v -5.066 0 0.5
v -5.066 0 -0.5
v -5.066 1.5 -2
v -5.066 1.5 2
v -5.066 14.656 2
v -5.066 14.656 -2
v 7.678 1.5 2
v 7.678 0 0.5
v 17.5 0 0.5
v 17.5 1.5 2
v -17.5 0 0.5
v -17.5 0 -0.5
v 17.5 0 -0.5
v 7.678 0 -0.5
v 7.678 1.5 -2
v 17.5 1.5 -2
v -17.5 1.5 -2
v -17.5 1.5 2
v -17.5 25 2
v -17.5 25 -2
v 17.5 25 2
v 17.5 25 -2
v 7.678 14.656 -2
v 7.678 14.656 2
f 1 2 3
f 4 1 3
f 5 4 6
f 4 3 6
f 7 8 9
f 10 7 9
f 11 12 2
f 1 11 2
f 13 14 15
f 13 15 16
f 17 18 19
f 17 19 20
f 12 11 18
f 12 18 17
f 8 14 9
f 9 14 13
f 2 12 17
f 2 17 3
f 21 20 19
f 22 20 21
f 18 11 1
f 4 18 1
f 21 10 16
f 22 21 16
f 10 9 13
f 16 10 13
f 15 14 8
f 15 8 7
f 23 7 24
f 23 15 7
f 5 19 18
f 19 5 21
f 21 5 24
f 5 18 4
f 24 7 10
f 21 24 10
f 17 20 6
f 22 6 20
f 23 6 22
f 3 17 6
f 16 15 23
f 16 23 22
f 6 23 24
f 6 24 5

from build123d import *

# Parameters (mm, degrees)
SKETCH_1_W          = 35
SKETCH_1_H          = 4
EXTRUDE_1_DEPTH     = 25
CHAMFER_1_SIZE      = 1.5
SKETCH_2_W          = 12.744138526
SKETCH_2_H          = 17.309109507
CUT_EXTRUDE_1_DEPTH = 10


with BuildPart() as part:
    # 草图1 → 凸台-拉伸1 (new body)
    with BuildSketch(Plane(origin=(0, 0, 0), x_dir=(1, 0, 0), z_dir=(0, 1, 0))):
        Rectangle(SKETCH_1_W, SKETCH_1_H)
    extrude(amount=EXTRUDE_1_DEPTH)

    # 倒角1
    chamfer_1_edges = [part.edges().sort_by_distance(p)[0] for p in [
        (0, 0, 2),
        (0, 0, -2),
    ]]
    chamfer(chamfer_1_edges, length=CHAMFER_1_SIZE)

    # 草图2 → 切除-拉伸1 (cut)
    with BuildSketch(Plane(origin=(0, 0, -2), x_dir=(-1, 0, 0), z_dir=(0, 0, -1))):
        with Locations((-1.305884938, 6.001185717)):
            Rectangle(SKETCH_2_W, SKETCH_2_H)
    extrude(amount=-CUT_EXTRUDE_1_DEPTH, mode=Mode.SUBTRACT)


solid = part.part
